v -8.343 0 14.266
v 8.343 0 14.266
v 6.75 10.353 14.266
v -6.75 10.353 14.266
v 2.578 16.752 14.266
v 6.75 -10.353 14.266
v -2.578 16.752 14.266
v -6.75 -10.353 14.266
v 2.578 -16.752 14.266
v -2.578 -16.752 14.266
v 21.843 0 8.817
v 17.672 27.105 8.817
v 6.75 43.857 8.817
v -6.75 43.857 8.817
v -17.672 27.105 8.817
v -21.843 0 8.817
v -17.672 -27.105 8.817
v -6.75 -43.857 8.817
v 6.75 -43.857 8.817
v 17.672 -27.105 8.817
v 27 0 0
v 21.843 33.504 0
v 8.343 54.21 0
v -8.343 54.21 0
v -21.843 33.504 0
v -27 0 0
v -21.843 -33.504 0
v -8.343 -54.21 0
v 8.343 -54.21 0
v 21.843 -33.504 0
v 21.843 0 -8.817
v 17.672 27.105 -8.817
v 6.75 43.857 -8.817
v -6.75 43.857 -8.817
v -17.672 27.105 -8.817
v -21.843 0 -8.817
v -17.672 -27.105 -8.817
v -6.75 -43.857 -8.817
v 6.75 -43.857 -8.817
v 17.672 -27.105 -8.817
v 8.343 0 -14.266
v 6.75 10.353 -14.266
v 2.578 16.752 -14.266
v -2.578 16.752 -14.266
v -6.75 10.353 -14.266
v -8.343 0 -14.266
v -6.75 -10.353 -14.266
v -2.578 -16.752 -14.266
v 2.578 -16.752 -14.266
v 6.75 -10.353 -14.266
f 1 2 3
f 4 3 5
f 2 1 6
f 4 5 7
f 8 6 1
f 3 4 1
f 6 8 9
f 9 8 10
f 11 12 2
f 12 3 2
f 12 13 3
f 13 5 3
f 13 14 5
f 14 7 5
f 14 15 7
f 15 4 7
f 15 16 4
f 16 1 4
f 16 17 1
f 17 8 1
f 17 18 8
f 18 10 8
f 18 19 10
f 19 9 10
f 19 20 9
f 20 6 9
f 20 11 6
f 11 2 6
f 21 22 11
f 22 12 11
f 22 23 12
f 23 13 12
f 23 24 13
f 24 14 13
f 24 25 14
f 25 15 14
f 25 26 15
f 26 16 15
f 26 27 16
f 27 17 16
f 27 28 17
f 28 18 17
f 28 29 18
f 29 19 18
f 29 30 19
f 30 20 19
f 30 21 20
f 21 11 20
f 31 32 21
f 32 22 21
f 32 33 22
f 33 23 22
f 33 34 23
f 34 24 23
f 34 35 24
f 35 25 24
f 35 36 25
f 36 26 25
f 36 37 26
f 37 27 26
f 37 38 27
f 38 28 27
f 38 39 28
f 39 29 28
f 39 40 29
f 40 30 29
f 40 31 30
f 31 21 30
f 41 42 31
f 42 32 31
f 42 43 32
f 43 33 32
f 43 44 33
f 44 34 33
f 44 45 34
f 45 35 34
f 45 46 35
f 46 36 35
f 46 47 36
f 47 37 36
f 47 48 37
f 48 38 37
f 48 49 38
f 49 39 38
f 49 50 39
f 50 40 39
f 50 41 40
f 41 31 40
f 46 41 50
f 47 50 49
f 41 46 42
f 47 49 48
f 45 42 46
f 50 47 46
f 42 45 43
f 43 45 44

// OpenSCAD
// Generated by SolidPython 1.0.1 on 2020-07-29 00:46:49


scale(v = [9, 19, 5]) {
	sphere(r = 3);
}
/***********************************************
*********      SolidPython code:      **********
************************************************
 
# import packages: SolidPython
from solid import *
from solid.utils import *
from itertools import chain, combinations, permutations


class Resize:

    def __init__(self, scad_file):
        self.scad_file = scad_file
        #self.scad_file = import_scad(scad_file)
        # cone/cylinder param:
        self.r1 = 0
        self.r2 = 0
        self.h = 0
        # rectangular prism param:
        self.w = 0
        self.l = 0
        # ellipse param:
        self.r = 0

    # import OpenScad code (file name corresponds to shape)


    # classify shape + parameters
    def assign(self, param1, param2, param3):
        if self.scad_file == 'cone.scad':
            self.r1 = param1
            self.r2 = param2
            self.h = param3
        elif self.scad_file == 'cylinder.scad':
            self.r1 = param1
            self.r2 = param2
            self.h = param3
        elif self.scad_file == 'rectangularPrism.scad':
            self.h = param1
            self.l = param2
            self.w = param3
        else:
            self.r = param1
            self.h = param2

    # resize parameters
    def iterate(self):
        x = range(3, 20, 2)
        i = 1
        if self.scad_file == 'cone.scad':
            tempList = list(permutations(x, 2))
            for temp in tempList:
                param1 = temp[0]
                param2 = temp[1]
                filepath = 'produced_scad_files/' + 'cone' + str(param1) + '_' + str(param2) + '_' + '.scad'
                scad_render_to_file(cylinder(h=param1, r1=param2, r2=0), filepath)

        elif self.scad_file == 'cylinder.scad':
            tempList = list(permutations(x, 3))
            for temp in tempList:
                param1 = temp[0]
                param2 = temp[1]
                filepath = 'produced_scad_files/' + 'cylinder' + str(param1) + '_' + str(param2) + '_' + '.scad'
                scad_render_to_file(cylinder(h=param1, r1=param2, r2=param2), filepath)

        elif self.scad_file == 'rectangularPrism.scad':
            tempList = list(permutations(x, 3))
            for temp in tempList:
                param1 = temp[0]
                param2 = temp[1]
                param3 = temp[2]
                filepath = 'produced_scad_files/' + 'rectangularPrism' + str(param1) + '_' + str(param2) + '_' + str(
                    param3) + '.scad'
                scad_render_to_file(cube(size=(param1, param2, param3)), filepath)

        elif self.scad_file == 'ellipse.scad':
            tempList = list(permutations(x, 4))
            for temp in tempList:
                param1 = temp[0]
                param2 = temp[1]
                param3 = temp[2]
                param4 = temp[3]
                filepath = 'produced_scad_files/' + 'ellipse' + str(param1) + '_' + str(param2) + '_' + str(param3) + '_' + str(param4) + '.scad'
                scad_render_to_file(scale([param1, param2, param3])(sphere(r=param4)), filepath)

    def render_to_scadfile(self):
        scad_render_to_file(scad, 'example.scad') 
 
************************************************/
